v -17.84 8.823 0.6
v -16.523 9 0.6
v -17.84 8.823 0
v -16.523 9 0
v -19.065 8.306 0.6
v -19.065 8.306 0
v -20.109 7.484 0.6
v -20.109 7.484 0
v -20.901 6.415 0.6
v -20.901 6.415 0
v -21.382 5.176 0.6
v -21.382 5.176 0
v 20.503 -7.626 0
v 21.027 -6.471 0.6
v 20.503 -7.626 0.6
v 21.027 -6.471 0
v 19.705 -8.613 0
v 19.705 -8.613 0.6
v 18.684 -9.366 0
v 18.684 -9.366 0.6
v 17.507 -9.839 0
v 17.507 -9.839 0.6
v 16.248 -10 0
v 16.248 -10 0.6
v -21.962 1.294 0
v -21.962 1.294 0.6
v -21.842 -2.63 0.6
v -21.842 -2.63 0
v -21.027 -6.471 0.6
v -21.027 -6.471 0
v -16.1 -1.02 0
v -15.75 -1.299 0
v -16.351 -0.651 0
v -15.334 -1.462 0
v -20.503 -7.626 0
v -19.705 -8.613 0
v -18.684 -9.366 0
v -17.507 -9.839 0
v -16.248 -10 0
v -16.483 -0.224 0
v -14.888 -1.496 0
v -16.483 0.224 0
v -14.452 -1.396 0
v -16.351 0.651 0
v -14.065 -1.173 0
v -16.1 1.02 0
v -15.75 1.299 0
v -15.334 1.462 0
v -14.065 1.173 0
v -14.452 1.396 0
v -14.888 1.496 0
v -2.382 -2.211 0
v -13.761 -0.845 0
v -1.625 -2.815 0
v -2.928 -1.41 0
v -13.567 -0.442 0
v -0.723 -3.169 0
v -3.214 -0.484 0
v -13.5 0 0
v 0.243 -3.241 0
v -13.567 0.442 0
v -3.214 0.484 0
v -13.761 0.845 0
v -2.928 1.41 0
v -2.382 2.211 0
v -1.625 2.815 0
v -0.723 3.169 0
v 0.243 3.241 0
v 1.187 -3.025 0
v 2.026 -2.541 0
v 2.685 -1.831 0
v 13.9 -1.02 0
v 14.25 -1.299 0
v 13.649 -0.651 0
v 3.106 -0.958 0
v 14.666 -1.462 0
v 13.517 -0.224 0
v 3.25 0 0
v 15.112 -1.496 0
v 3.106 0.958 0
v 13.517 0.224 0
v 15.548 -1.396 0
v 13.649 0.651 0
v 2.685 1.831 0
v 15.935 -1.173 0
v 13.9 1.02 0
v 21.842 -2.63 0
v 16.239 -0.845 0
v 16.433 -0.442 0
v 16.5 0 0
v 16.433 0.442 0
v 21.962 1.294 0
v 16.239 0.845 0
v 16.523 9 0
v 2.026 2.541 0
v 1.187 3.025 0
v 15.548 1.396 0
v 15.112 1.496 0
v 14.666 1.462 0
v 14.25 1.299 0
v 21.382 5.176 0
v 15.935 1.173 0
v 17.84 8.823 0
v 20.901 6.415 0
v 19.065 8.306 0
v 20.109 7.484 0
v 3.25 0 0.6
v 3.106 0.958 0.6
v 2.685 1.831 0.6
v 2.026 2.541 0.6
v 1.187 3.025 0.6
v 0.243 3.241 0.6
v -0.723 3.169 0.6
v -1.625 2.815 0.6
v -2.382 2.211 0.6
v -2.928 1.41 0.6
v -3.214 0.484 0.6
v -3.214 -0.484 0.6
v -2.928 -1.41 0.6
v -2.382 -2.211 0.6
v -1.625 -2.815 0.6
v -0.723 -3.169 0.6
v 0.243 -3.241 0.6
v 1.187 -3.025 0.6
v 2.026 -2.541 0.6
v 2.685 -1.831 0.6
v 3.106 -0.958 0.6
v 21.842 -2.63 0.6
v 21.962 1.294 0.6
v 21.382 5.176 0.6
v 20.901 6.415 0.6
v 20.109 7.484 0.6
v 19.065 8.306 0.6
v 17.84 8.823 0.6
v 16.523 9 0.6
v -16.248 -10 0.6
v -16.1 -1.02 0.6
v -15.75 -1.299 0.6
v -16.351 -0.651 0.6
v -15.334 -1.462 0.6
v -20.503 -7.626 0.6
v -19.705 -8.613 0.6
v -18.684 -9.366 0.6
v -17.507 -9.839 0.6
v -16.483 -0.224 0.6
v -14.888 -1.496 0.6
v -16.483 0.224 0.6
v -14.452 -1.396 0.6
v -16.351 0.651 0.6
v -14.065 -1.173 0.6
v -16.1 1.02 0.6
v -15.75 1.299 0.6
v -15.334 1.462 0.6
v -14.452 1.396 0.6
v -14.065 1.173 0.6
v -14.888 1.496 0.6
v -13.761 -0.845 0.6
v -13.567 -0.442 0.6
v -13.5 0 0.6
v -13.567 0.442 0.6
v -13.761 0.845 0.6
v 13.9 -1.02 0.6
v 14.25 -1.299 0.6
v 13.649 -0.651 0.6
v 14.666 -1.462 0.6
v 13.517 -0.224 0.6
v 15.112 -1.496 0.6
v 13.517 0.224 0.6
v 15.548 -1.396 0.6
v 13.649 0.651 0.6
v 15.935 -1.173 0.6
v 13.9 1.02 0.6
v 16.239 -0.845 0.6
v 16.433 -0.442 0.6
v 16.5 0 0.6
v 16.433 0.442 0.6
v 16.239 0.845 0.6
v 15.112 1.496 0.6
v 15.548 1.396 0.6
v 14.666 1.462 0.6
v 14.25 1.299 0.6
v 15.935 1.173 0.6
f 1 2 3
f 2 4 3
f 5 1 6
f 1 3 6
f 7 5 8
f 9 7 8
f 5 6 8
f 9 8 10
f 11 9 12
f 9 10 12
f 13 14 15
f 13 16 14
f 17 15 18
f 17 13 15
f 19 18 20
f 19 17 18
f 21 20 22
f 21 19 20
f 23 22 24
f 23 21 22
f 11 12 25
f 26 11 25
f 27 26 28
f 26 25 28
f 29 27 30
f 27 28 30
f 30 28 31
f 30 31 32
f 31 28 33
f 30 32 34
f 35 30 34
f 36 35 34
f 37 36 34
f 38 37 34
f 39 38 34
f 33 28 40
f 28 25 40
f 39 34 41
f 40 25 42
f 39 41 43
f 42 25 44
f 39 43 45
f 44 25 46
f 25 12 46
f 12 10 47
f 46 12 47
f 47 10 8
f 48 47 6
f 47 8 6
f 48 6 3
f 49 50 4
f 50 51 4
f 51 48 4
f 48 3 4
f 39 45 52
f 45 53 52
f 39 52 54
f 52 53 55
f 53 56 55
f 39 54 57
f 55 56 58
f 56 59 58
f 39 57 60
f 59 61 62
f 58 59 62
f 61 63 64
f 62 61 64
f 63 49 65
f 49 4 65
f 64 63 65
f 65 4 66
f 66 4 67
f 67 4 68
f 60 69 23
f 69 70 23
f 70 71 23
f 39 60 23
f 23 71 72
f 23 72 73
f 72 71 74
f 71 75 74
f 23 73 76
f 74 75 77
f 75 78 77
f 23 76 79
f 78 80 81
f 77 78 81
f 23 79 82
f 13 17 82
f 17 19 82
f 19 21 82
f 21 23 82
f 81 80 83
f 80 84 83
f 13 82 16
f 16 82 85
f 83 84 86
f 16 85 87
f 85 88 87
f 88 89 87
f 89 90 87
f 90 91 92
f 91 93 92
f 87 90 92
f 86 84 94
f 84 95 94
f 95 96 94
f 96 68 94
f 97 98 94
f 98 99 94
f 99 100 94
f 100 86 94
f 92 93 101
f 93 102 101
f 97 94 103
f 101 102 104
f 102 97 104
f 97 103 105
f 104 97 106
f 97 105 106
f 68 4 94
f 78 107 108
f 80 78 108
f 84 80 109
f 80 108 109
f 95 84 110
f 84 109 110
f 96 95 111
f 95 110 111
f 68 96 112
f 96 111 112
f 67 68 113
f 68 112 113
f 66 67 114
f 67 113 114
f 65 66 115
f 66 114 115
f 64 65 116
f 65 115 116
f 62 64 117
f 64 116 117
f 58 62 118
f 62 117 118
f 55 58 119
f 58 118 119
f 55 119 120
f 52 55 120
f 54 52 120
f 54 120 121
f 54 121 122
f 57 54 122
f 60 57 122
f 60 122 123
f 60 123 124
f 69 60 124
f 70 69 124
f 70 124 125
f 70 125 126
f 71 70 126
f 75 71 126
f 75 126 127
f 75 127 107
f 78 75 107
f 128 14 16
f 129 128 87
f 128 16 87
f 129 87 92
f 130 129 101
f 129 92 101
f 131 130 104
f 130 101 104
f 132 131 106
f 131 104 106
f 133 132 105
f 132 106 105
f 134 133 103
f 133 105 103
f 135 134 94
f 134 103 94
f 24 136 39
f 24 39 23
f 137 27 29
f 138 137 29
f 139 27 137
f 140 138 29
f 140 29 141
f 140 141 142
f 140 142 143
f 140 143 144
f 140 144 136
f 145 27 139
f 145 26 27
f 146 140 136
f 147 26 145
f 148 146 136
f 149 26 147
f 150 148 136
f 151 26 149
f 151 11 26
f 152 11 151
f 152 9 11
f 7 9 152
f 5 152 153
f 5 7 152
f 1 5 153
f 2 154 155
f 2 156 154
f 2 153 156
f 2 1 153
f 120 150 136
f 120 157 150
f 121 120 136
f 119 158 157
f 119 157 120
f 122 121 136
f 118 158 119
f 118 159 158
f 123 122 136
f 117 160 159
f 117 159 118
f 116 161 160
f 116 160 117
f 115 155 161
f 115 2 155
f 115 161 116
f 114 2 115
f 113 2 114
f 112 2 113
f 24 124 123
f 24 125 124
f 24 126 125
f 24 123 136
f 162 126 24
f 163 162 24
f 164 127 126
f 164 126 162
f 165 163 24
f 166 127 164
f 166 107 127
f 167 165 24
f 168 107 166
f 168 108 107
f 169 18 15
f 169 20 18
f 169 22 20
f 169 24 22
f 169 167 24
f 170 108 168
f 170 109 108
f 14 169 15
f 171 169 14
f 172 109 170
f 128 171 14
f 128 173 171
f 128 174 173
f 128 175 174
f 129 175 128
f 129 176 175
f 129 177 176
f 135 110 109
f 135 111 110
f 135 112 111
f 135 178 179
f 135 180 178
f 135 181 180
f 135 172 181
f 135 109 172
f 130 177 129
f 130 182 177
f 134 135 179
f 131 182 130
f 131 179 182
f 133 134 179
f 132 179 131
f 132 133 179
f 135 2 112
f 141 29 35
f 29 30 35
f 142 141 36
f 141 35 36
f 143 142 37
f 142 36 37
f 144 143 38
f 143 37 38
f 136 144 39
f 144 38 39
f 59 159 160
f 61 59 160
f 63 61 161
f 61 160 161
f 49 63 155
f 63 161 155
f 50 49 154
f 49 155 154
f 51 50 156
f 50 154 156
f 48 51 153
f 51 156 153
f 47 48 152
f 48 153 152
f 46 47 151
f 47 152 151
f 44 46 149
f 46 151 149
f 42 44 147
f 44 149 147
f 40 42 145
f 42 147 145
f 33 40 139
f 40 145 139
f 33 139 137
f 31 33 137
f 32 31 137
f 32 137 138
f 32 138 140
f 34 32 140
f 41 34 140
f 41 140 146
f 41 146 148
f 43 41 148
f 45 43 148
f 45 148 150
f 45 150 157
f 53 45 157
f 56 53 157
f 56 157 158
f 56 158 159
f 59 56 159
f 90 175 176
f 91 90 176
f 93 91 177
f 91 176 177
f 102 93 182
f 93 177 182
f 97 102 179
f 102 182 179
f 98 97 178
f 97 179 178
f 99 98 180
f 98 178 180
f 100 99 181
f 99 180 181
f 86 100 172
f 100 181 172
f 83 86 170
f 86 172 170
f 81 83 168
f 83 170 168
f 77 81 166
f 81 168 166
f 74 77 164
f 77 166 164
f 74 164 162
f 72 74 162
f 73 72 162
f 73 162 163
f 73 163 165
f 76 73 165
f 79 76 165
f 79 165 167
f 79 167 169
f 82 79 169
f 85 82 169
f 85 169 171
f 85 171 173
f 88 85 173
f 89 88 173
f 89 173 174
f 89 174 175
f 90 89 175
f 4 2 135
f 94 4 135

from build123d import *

# Parameters (mm, degrees)
SKETCH_1_R          = 22
EXTRUDE_1_DEPTH     = 0.6
SKETCH_2_R          = 3.25
CUT_EXTRUDE_1_DEPTH = 32.118483254
SKETCH_3_R          = 1.5
CUT_EXTRUDE_2_DEPTH = 32.118483254
SKETCH_5_W          = 56.096765119
SKETCH_5_H          = 19.515049226
SKETCH_5_W_2        = 56.672855133
SKETCH_5_H_2        = 21.675386779
CUT_EXTRUDE_4_DEPTH = 32.118483254
FILLET_1_R          = 5


with BuildPart() as part:
    # Эскиз1 → Бобышка-Вытянуть1 (new body)
    with BuildSketch(Plane.XY):
        Circle(SKETCH_1_R)
    extrude(amount=EXTRUDE_1_DEPTH)

    # Эскиз2 → Вырез-Вытянуть1 (cut, through all)
    with BuildSketch(Plane.XY.offset(0.6)):
        Circle(SKETCH_2_R)
    extrude(amount=-CUT_EXTRUDE_1_DEPTH, mode=Mode.SUBTRACT)

    # Эскиз3 → Вырез-Вытянуть2 (cut, through all)
    with BuildSketch(Plane.XY.offset(0.6)):
        with Locations((-15, 0)):
            Circle(SKETCH_3_R)
        with Locations((15, 0)):
            Circle(SKETCH_3_R)
    extrude(amount=-CUT_EXTRUDE_2_DEPTH, mode=Mode.SUBTRACT)

    # Эскиз5 → Вырез-Вытянуть4 (cut, through all)
    with BuildSketch(Plane.XY.offset(0.6)):
        with Locations((0.108016877, 18.757524613)):
            Rectangle(SKETCH_5_W, SKETCH_5_H)
        with Locations((0.396061884, -20.83769339)):
            Rectangle(SKETCH_5_W_2, SKETCH_5_H_2)
    extrude(amount=-CUT_EXTRUDE_4_DEPTH, mode=Mode.SUBTRACT)

    # Скругление1
    fillet_1_edges = [part.edges().sort_by_distance(p)[0] for p in [
        (-20.0748599, 9, 0.3),
        (20.0748599, 9, 0.3),
        (19.595917942, -10, 0.3),
        (-19.595917942, -10, 0.3),
    ]]
    fillet(fillet_1_edges, radius=FILLET_1_R)


solid = part.part
